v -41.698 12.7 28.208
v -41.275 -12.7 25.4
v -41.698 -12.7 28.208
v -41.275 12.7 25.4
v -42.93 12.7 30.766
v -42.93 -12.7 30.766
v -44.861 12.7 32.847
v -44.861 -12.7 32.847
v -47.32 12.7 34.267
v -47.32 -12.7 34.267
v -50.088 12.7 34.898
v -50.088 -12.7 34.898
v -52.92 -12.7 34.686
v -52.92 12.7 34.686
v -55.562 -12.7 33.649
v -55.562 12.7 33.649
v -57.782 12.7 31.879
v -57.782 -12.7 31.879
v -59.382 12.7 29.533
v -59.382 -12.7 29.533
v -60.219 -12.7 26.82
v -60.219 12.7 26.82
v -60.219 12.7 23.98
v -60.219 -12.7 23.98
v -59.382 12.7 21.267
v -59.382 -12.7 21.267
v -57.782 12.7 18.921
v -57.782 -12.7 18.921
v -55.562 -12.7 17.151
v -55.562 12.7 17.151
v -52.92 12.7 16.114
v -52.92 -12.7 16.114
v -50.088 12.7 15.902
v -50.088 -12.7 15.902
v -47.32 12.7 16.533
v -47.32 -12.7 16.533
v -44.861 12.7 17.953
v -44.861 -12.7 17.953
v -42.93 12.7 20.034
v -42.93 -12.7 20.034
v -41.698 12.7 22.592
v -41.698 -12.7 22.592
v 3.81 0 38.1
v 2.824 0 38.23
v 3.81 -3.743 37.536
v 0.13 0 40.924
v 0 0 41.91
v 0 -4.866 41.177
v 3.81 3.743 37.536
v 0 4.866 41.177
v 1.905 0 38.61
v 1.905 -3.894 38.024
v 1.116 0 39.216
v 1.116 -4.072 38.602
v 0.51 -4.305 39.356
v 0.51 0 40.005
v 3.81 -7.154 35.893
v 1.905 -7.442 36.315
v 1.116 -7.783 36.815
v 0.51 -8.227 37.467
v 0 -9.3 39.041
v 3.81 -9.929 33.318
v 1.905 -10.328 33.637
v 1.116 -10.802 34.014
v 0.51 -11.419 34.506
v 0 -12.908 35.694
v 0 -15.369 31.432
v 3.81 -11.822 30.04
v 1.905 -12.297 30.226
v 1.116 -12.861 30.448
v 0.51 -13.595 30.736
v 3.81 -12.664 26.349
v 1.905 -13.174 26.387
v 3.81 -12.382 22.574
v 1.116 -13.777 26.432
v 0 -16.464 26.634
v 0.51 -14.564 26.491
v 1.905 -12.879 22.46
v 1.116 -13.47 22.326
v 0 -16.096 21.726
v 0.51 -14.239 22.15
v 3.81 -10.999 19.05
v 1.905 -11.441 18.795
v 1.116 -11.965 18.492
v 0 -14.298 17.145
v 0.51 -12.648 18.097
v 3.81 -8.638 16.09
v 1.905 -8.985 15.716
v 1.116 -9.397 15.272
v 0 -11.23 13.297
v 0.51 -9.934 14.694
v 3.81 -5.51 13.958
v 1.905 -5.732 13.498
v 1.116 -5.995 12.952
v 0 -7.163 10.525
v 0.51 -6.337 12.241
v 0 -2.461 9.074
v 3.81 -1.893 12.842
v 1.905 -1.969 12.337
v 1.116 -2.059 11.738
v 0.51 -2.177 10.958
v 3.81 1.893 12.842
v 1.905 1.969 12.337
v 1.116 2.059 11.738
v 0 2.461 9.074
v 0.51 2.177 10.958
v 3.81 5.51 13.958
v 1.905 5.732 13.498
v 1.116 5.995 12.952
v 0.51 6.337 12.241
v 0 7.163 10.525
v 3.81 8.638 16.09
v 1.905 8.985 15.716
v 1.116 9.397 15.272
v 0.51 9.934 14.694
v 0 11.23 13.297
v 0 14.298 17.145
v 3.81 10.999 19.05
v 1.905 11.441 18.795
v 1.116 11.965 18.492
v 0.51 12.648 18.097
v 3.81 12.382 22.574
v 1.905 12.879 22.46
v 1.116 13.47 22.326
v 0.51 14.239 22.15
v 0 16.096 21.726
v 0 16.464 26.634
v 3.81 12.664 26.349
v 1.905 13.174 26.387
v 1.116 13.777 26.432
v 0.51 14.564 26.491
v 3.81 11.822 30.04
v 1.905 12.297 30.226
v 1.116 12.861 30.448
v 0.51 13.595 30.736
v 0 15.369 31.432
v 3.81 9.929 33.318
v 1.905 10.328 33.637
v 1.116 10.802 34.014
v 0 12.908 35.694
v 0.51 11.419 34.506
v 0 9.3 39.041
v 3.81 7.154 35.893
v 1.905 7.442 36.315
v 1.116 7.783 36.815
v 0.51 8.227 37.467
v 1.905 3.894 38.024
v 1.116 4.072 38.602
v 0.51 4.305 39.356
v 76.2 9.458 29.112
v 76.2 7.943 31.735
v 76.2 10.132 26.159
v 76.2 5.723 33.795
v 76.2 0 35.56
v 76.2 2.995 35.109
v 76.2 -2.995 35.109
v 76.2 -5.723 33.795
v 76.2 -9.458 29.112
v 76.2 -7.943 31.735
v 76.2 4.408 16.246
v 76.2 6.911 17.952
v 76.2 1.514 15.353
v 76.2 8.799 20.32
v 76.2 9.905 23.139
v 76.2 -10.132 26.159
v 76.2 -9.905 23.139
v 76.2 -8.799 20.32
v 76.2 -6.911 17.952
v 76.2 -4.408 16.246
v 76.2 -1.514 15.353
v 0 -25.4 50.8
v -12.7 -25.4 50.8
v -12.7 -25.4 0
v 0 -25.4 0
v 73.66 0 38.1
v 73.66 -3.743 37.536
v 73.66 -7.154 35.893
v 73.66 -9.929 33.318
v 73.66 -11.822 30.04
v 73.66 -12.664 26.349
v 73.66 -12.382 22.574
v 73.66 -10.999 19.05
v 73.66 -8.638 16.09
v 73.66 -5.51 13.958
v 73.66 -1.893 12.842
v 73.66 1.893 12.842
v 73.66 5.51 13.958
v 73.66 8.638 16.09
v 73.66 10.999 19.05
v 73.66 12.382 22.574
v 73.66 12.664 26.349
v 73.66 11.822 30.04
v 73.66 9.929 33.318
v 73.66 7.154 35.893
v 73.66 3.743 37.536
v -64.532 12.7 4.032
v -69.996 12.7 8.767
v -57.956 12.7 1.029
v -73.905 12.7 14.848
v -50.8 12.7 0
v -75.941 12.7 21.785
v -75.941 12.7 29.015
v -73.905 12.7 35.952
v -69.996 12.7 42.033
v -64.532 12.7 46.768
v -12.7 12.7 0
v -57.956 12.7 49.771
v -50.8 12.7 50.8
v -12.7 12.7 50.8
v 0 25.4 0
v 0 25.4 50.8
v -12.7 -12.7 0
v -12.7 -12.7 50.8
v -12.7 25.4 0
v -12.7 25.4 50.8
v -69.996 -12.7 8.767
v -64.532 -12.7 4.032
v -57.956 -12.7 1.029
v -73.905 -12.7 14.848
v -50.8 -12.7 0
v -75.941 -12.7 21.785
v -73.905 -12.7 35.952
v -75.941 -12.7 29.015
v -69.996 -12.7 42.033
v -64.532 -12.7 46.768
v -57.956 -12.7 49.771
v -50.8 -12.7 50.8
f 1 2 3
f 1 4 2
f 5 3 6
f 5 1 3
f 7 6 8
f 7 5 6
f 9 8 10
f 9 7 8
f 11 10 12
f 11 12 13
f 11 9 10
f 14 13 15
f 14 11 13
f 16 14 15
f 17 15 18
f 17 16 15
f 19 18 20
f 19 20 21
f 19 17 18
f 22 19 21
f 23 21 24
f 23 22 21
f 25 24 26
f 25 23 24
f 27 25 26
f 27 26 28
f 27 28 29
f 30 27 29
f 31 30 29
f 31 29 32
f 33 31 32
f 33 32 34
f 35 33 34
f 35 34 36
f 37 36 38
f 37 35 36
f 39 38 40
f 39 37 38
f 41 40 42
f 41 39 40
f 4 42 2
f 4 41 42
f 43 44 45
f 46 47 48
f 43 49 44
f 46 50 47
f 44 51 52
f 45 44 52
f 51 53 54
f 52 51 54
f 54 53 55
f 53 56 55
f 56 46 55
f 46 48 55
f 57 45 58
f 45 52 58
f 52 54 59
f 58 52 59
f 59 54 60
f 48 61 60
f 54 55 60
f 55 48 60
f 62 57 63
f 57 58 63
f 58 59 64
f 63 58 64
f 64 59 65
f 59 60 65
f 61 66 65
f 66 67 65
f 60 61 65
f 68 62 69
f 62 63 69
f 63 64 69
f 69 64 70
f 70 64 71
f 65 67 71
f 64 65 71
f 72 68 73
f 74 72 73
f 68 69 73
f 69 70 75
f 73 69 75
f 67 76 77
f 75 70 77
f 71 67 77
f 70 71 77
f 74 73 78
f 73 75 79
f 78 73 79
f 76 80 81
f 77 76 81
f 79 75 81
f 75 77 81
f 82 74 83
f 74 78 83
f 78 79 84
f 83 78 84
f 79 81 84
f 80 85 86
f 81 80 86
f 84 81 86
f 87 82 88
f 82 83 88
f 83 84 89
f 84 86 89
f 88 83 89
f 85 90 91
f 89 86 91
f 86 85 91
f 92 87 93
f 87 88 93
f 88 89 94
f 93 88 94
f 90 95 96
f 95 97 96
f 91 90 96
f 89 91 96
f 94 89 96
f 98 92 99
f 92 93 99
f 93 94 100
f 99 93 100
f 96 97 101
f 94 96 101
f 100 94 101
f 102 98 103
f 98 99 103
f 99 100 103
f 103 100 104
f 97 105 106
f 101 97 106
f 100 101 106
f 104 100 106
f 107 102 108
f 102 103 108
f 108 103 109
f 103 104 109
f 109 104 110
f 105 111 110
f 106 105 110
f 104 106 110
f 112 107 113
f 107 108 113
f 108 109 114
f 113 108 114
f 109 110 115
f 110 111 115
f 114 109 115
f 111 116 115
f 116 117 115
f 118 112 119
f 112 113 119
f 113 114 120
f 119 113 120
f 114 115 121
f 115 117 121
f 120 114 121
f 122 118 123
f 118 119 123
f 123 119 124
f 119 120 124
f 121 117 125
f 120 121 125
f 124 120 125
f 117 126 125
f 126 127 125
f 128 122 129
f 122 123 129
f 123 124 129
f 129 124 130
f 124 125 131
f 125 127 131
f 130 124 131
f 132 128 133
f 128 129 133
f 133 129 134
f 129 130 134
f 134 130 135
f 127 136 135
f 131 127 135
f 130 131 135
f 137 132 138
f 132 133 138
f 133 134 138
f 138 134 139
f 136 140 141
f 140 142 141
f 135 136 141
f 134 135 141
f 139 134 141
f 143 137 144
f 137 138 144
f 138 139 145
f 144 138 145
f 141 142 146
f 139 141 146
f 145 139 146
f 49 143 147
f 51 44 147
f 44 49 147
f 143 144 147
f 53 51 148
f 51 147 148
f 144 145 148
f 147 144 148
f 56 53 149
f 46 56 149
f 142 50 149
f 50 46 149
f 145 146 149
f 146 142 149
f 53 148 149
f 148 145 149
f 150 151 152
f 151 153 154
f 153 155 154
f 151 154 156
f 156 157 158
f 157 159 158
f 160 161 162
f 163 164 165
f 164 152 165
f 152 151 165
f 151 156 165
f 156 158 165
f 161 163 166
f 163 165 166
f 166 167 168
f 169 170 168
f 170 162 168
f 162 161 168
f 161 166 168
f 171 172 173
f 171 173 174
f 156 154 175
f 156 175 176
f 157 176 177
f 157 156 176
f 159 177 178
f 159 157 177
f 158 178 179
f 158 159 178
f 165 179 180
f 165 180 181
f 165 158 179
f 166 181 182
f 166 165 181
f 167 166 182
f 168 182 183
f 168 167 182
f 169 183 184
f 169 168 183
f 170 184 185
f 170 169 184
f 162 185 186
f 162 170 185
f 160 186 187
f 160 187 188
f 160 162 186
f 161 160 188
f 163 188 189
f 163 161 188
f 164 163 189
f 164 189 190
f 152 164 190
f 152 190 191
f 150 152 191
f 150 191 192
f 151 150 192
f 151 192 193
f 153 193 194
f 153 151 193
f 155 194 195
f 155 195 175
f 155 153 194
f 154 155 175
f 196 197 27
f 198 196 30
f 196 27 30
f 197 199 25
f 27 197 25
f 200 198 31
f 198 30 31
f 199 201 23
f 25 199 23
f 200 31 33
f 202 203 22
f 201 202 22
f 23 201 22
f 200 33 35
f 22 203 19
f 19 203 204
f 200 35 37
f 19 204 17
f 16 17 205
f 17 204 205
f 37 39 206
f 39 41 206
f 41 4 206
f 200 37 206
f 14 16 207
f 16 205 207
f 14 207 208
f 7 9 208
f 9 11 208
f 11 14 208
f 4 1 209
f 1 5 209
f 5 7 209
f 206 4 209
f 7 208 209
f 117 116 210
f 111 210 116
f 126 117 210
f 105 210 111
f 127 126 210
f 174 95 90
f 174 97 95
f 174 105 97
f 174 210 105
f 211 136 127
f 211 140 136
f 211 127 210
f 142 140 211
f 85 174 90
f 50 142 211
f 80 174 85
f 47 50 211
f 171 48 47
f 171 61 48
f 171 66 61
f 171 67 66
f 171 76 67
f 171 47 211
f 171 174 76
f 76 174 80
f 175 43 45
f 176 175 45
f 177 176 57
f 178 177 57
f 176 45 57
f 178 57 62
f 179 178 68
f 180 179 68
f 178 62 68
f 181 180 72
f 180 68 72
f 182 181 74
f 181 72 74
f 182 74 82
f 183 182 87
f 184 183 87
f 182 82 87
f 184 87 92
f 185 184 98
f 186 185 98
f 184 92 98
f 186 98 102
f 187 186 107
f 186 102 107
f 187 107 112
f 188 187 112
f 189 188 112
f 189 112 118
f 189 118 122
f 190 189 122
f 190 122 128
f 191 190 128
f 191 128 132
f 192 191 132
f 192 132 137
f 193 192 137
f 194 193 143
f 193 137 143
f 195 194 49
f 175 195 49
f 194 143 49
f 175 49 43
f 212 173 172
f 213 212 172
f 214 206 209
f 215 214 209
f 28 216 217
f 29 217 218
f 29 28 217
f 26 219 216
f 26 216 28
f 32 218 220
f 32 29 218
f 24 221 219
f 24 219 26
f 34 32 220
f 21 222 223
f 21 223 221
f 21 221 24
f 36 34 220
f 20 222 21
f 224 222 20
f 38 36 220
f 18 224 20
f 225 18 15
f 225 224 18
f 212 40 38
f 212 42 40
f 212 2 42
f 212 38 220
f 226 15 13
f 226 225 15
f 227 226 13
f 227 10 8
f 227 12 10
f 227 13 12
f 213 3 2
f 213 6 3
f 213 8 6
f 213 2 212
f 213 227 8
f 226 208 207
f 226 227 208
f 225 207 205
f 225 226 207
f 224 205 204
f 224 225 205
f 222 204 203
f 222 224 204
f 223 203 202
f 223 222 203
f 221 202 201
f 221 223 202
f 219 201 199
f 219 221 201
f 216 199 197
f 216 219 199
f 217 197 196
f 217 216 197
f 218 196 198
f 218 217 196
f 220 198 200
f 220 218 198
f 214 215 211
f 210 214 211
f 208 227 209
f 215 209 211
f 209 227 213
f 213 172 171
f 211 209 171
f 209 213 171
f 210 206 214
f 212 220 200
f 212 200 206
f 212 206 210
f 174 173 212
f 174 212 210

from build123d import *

# Parameters (mm, degrees)
F0_R     = 9.525
F1_DEPTH = 12.7
F0_W     = 12.7
F0_H     = 50.8
F2_DEPTH = 25.4
F6_SIZE2 = 2.54
F6_SIZE  = 2.54


with BuildPart() as f1:
    # F0 (on Front) → F1 (new body, symmetric)
    with BuildSketch(Plane.XZ):
        with BuildLine():
            Line((-50.8, 0), (-12.7, 0))
            Line((-12.7, 0), (-12.7, 50.8))
            Line((-12.7, 50.8), (-50.8, 50.8))
            ThreePointArc((-50.8, 50.8), (-76.2, 25.4), (-50.8, 0))
        make_face()
        with Locations((-50.8, 25.4)):
            Circle(F0_R, mode=Mode.SUBTRACT)
    extrude(amount=F1_DEPTH, both=True)

    # F0 (on Front) → F2 (join, symmetric)
    with BuildSketch(Plane.XZ):
        with Locations((-6.35, 25.4)):
            Rectangle(F0_W, F0_H)
    extrude(amount=F2_DEPTH, both=True)

    # F4 (on Front) → F5 (revolve)
    with BuildSketch(Plane.XZ):
        with BuildLine():
            Line((0, 41.91), (0, 25.4))
            Line((0, 25.4), (76.2, 25.4))
            Line((76.2, 25.4), (76.2, 38.1))
            Line((76.2, 38.1), (3.81, 38.1))
            ThreePointArc((3.81, 38.1), (1.1159231637, 39.2159231637), (0, 41.91))
        make_face()
    revolve(axis=Axis((44.0839976072, 0, 25.4), (1, 0, 0)))

    # F6
    f6_edges = [f1.edges().sort_by_distance(p)[0] for p in [
        (76.2, 0, 12.7),
    ]]
    chamfer(f6_edges, length=F6_SIZE, length2=F6_SIZE2)


solid = f1.part
